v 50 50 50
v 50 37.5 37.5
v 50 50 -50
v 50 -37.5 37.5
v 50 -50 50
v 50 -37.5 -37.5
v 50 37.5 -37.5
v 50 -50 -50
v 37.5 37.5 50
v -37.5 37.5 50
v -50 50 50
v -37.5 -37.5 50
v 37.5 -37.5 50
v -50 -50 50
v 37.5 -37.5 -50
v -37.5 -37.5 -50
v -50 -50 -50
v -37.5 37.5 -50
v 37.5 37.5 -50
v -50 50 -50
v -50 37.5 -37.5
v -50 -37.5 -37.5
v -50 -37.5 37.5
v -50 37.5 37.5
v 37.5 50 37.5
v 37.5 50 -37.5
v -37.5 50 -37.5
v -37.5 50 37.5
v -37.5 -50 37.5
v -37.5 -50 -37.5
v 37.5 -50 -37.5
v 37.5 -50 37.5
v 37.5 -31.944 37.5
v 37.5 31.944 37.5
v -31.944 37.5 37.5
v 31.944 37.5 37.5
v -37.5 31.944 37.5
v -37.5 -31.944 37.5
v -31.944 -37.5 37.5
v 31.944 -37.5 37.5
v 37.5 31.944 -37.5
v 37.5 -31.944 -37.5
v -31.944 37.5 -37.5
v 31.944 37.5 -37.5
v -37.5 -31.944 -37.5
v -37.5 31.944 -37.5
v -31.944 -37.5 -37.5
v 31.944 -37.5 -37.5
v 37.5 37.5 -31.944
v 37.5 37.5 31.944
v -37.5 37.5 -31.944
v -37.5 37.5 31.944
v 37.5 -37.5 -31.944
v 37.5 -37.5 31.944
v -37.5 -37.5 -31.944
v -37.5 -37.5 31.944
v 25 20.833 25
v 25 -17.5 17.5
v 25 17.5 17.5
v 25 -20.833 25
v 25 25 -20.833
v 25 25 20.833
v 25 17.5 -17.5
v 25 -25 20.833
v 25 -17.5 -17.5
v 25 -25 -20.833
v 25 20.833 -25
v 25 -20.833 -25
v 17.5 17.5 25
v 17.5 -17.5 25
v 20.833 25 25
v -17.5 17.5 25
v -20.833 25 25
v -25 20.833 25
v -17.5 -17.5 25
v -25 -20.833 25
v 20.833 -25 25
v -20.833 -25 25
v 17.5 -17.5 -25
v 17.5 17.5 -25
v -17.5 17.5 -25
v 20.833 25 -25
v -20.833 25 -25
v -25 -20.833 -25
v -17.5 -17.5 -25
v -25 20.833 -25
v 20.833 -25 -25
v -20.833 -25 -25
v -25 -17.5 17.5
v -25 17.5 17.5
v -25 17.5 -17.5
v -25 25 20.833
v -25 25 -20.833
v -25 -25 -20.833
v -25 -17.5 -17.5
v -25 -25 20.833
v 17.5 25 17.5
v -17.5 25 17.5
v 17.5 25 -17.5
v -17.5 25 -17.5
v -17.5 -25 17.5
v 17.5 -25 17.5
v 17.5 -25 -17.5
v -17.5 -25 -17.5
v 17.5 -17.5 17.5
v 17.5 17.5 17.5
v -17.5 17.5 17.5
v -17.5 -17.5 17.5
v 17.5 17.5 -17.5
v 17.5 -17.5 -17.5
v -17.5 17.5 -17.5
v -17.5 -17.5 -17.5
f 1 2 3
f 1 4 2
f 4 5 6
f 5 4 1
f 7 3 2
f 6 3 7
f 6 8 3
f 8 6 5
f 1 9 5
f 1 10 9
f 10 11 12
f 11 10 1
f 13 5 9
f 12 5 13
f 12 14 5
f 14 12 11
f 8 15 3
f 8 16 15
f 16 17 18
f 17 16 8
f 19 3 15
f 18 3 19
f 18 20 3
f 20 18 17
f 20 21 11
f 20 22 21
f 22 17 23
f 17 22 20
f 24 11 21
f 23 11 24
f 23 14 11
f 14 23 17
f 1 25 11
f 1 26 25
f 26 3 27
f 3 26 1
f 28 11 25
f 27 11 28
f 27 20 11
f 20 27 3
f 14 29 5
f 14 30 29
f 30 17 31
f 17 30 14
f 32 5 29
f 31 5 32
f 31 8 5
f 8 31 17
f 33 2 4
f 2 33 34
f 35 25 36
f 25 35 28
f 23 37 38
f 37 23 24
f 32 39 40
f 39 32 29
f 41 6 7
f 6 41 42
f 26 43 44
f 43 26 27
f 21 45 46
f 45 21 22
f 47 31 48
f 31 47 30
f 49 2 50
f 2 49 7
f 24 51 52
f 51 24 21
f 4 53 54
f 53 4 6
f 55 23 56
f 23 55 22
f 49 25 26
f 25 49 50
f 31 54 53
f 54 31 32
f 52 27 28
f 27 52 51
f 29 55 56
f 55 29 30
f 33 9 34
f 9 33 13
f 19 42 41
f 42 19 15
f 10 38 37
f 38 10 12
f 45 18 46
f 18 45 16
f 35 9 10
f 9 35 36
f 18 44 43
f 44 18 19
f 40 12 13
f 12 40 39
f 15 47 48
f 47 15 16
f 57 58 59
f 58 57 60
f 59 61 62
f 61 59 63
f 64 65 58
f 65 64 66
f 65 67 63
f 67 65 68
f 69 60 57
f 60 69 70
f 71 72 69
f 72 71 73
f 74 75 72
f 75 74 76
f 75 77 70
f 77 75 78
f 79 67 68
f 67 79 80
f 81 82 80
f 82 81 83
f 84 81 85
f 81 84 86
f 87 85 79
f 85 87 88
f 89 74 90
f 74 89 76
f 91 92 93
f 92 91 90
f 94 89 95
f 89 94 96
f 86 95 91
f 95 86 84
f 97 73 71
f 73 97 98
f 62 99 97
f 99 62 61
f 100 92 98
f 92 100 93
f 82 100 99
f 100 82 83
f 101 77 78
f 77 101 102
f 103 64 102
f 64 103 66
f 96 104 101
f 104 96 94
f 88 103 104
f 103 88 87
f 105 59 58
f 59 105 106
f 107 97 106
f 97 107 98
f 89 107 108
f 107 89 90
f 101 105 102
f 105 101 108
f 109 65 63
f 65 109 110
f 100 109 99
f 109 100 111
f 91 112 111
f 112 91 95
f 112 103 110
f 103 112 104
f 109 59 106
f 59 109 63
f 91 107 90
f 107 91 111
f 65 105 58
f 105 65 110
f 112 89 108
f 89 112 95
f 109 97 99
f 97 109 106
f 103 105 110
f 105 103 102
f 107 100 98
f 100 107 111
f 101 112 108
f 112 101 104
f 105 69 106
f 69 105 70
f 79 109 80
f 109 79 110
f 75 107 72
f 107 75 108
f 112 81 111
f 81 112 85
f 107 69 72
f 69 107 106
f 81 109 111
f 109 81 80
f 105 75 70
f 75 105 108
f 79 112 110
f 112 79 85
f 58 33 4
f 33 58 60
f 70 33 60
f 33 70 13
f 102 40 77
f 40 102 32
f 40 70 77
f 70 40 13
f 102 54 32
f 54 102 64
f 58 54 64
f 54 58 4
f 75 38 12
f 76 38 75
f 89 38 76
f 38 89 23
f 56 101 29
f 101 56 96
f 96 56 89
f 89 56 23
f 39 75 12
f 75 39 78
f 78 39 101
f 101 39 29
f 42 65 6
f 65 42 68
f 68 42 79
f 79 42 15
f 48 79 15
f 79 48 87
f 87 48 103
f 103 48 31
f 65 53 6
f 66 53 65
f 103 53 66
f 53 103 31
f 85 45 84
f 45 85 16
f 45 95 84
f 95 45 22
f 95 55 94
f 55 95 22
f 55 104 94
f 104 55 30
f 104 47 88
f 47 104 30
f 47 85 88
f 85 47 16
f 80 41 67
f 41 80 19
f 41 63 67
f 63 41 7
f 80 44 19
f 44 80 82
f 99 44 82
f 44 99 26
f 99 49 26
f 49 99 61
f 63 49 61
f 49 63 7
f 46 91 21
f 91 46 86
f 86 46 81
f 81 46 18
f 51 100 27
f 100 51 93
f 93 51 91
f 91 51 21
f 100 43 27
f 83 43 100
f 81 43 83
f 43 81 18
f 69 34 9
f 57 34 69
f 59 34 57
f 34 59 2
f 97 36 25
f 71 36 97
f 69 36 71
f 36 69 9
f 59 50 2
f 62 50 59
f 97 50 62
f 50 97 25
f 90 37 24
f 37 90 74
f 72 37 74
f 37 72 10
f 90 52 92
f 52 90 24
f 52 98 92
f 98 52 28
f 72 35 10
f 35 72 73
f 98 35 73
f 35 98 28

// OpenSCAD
//Set parameters here
ocs= 100; //Outer cube size
oct= 12.5; //Outer cube thickness
ics=  50; //Inner cube size
ict= 7.5; //Inner cube thickness

//creates the Outer and inner cubes
difference(){
cube(ocs, center=true);
cube([ocs+2,ocs-2*oct,ocs-2*oct],center=true);
cube([ocs-2*oct,ocs+2,ocs-2*oct],center=true);
cube([ocs-2*oct,ocs-2*oct,ocs+2],center=true);
}
difference(){
cube(ics, center=true);
cube([ics+2,ics-2*ict,ics-2*ict],center=true);
cube([ics-2*ict,ics+2,ics-2*ict],center=true);
cube([ics-2*ict,ics-2*ict,ics+2],center=true);
}

//creates the module for the connecting polyhedron at one corner in the positive quadrant
module connector(){
polyhedron(points=[
[ocs/2-oct,ocs/2-oct,ocs/2],
[ocs/2-oct,ocs/2,ocs/2-oct],
[ocs/2,ocs/2-oct,ocs/2-oct],
[ics/2-ict,ics/2-ict,ics/2],
[ics/2-ict,ics/2,ics/2-ict],
[ics/2,ics/2-ict,ics/2-ict],
],
triangles=[[0,1,2],[0,4,1],[1,4,2],[0,3,4],[0,2,3],[3,2,5],[5,2,4],[5,4,3]]);
}


//mirrors connector to all corners
connector();
mirror([1,0,0]){
connector();}
mirror([0,1,0]){
connector();
mirror([1,0,0])
connector();
}
mirror([0,0,1]){
connector();
mirror([1,0,0]){
connector();}
mirror([0,1,0]){
connector();
mirror([1,0,0])
connector();
}
}
